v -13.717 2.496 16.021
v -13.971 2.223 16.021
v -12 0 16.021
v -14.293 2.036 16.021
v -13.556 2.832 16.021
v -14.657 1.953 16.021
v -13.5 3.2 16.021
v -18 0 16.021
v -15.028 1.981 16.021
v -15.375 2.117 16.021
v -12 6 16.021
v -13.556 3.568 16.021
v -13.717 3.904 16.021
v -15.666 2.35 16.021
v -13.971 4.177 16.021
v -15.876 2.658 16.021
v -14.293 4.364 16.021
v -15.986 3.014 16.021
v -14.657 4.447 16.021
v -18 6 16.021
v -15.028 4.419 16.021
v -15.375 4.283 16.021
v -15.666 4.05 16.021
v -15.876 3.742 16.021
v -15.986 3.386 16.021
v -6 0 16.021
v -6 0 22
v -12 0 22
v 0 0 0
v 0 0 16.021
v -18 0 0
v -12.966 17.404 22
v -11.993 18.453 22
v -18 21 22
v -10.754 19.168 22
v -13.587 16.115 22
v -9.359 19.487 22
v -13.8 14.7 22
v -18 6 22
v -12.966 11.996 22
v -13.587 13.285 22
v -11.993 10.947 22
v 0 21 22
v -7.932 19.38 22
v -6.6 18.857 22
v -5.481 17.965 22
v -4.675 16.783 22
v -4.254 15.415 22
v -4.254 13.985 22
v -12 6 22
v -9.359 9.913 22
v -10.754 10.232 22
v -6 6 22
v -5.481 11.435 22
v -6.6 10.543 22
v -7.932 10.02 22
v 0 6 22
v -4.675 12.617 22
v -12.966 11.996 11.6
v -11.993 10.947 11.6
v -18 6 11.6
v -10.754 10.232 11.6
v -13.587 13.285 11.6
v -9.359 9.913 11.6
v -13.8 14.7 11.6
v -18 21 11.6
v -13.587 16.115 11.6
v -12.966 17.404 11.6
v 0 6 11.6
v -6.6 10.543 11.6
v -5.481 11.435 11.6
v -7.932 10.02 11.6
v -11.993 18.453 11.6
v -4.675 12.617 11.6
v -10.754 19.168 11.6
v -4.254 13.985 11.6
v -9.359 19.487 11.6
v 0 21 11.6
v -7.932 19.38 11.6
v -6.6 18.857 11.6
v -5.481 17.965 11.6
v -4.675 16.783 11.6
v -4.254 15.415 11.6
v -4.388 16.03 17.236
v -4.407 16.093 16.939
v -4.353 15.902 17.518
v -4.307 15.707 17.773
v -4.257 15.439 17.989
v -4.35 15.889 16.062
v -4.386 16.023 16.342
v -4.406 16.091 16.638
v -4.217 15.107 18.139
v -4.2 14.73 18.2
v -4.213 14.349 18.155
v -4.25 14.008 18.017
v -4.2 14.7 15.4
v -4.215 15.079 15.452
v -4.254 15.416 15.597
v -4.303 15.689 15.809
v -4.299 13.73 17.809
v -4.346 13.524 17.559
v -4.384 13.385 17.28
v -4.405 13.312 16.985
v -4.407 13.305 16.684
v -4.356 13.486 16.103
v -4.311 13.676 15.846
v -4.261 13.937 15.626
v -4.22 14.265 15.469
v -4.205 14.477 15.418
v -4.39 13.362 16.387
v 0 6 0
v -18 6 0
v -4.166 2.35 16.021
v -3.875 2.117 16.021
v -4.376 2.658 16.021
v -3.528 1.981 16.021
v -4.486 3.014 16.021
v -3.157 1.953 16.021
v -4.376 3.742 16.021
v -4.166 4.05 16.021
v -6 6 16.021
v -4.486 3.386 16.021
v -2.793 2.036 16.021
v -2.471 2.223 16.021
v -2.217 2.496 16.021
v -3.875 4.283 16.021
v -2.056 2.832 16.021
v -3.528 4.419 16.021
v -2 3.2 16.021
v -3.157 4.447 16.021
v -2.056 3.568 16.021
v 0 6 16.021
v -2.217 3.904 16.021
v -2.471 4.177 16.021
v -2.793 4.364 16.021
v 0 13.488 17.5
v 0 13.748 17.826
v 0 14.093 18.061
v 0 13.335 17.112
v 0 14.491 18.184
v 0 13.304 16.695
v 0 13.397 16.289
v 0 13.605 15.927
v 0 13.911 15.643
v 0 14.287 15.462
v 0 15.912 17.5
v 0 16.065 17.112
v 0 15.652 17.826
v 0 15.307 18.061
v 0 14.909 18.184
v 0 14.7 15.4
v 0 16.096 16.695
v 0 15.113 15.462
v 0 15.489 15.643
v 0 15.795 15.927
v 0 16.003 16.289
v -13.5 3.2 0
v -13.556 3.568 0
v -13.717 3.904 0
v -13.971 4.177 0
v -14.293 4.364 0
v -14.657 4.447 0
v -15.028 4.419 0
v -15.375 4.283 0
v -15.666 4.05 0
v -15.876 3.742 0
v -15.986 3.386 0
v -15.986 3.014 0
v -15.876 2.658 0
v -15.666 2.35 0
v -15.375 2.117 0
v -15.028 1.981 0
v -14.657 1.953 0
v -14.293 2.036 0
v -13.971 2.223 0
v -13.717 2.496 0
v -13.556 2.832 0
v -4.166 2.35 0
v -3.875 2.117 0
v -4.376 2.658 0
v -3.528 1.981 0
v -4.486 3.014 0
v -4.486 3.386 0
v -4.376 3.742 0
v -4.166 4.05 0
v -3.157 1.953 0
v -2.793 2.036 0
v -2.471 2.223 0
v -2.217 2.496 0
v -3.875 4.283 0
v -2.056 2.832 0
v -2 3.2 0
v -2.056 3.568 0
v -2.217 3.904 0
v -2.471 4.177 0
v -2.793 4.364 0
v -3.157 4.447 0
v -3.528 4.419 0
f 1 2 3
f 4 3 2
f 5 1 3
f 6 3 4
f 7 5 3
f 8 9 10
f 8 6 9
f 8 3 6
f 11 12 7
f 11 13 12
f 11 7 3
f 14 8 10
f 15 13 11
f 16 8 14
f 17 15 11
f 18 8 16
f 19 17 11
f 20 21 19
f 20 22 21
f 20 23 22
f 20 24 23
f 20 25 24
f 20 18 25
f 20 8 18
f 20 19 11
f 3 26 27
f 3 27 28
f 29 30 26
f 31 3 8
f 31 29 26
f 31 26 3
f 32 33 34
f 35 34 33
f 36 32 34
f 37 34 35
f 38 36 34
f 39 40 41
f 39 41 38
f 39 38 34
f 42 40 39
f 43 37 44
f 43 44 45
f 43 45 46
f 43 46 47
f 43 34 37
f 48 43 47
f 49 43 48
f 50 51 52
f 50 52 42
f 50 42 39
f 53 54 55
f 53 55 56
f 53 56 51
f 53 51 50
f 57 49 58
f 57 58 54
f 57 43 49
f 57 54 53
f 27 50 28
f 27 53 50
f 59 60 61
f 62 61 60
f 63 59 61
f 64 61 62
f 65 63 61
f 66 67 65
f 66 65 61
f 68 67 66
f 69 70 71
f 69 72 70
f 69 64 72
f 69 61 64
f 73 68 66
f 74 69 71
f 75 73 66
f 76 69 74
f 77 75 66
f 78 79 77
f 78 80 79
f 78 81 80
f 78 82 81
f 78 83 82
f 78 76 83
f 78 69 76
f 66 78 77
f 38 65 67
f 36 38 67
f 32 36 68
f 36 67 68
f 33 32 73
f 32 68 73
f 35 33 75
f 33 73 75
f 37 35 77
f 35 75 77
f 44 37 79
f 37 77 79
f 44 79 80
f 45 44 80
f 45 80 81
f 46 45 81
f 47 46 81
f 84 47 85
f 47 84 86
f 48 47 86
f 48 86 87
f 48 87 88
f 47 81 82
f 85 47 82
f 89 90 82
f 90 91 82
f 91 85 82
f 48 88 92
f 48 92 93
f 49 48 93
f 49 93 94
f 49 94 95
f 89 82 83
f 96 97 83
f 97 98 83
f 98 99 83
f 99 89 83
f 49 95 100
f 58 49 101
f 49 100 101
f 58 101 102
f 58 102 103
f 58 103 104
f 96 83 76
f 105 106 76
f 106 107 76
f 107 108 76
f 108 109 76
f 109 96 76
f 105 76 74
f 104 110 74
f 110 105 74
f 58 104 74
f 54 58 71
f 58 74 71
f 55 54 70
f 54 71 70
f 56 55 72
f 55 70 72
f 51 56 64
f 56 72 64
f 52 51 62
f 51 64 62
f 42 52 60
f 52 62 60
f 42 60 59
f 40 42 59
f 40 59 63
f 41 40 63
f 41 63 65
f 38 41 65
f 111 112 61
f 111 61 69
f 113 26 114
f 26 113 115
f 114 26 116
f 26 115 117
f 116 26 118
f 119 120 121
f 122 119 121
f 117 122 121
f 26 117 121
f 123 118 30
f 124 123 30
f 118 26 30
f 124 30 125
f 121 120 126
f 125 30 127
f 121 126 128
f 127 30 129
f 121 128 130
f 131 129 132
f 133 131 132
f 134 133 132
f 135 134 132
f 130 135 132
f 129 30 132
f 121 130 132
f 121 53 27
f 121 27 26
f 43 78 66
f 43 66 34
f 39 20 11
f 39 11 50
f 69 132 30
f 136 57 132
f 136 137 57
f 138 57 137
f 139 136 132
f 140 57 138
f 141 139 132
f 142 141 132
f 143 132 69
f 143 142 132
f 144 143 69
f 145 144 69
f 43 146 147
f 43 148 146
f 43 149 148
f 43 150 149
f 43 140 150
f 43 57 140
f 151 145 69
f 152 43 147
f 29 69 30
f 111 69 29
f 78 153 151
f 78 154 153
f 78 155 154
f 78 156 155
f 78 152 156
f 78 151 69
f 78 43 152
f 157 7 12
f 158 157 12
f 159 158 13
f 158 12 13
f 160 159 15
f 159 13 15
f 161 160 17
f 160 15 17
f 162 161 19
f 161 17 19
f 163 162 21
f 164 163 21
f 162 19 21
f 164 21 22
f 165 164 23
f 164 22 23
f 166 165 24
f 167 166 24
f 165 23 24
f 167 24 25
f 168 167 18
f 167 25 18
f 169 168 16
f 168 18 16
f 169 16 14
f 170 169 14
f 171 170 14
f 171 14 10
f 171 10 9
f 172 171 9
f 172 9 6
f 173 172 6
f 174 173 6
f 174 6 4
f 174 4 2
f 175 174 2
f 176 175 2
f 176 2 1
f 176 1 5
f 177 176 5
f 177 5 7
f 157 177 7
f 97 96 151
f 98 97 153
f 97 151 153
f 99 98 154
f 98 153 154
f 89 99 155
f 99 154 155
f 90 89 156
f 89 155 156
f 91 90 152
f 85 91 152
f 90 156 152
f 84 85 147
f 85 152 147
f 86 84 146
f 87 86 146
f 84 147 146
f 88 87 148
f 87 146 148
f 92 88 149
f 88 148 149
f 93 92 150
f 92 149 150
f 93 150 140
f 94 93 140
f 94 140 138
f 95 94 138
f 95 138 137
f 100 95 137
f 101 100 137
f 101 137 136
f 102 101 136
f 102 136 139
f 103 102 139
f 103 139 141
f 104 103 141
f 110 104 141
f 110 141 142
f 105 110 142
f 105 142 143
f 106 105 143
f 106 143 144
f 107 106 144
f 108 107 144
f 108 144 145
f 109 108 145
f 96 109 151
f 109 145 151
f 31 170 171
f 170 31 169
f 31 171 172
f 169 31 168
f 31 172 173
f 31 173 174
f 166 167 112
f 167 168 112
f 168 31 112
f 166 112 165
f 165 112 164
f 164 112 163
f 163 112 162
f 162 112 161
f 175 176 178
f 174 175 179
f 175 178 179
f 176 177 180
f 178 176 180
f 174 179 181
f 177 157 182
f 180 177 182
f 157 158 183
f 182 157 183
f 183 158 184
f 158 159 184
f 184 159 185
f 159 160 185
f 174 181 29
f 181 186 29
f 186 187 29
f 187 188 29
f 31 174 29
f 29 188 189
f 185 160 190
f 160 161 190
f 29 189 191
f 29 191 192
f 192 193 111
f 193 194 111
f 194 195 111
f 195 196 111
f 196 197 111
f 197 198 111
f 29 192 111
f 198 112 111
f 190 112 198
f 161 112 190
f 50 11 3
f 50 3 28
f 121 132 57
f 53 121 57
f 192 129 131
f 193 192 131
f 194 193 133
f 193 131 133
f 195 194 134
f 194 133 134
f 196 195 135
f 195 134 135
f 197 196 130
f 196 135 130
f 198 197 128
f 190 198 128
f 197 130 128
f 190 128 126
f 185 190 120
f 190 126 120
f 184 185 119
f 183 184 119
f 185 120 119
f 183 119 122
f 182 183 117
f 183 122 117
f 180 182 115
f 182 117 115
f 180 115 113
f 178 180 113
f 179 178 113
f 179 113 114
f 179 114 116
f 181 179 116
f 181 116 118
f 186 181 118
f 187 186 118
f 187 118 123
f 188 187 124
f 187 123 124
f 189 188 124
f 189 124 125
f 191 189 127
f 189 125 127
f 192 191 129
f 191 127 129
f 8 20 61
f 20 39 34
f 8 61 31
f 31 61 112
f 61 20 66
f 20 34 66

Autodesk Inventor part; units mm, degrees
ref_plane "YZ Plane" through (0, 0, 0) normal (1, 0, 0) x (0, 1, 0)
ref_plane "XZ Plane" through (0, 0, 0) normal (0, 1, 0) x (-1, 0, 0)
ref_plane "XY Plane" through (0, 0, 0) normal (0, 0, 1) x (1, 0, 0)
sketch "Sketch1" plane through (0, 0, 0) normal (0, 0, 1) x (1, 0, 0)
  line L0 (0, 0) -> (-18, 0)
  line L1 (-18, 0) -> (-18, 6)
  line L2 (-18, 6) -> (0, 6)
  line L3 (0, 6) -> (0, 0)
  dimension "d0" = 18
  dimension "d1" = 6
extrude "Extrusion1" add sketch "Sketch1" along normal blind 22
sketch "Sketch2" plane through (0, 0, 22) normal (0, 0, 1) x (1, 0, 0)
  line L0 (-18, 0) -> (0, 0) projected
  line L1 (0, 0) -> (0, 6) projected
  line L2 (0, 6) -> (-18, 6) projected
  line L3 (-18, 6) -> (-18, 0) projected
  circle A0 centre (-14.75, 3.2) radius 1.25
  circle A1 centre (-3.25, 3.2) radius 1.25
  dimension "d4" = 2.5
  dimension "d5" = 2.5
  dimension "d6" = 2.8
  dimension "d7" = 2.8
  dimension "d8" = 3.25
  dimension "d9" = 3.25
  dimension "d31" = 11.5
extrude "Extrusion2" cut sketch "Sketch2" against normal through all contours A0 | A1
sketch "Sketch3" plane through (0, 0, 0) normal (1, 0, 0) x (0, 0, -1)
  line L0 (0, 6) -> (0, 0) projected
  line L1 (0, 6) -> (-22, 6) projected
  line L2 (-22, 0) -> (-22, 6) projected
  line L3 (0, 0) -> (-22, 0) projected
  line L4 (0, 6) -> (-22, 6) projected
  line L5 (-22, 6) -> (-11.6, 6)
  line L6 (-11.6, 6) -> (-11.6, 21)
  line L7 (-11.6, 21) -> (-22, 21)
  line L8 (-22, 21) -> (-22, 6)
  dimension "d12" = 10.4
  dimension "d13" = 15
extrude "Extrusion3" add sketch "Sketch3" against normal up to surface (18 mm away) contours L1 L8 L7 L6
sketch "Sketch4" plane through (0, 6, 11.6) normal (0, 0, -1) x (-1, 0, 0)
  line L0 (18, 0) -> (18, 15) projected
  line L1 (0, 15) -> (18, 15) projected
  line L2 (0, 15) -> (0, 0) projected
  line L3 (18, 0) -> (0, 0) projected
  circle A0 centre (9, 8.7) radius 4.8
  point P0 (0, -6)
  dimension "d16" = 9.6
  dimension "d17" = 6.3
extrude "Extrusion4" cut sketch "Sketch4" against normal through all contours A0
sketch "Sketch5" plane through (-18, 0, 0) normal (-1, 0, 0) x (0, 0, 1)
  line L0 (22.0213, 0) -> (16.0213, 0)
  line L1 (16.0213, 0) -> (16.0213, 6)
  line L2 (16.0213, 6) -> (22.0213, 6)
  line L3 (22.0213, 6) -> (22.0213, 0)
  point P0 (0, 0)
  dimension "d20" = 6
  dimension "d21" = 6
extrude "Extrusion5" cut sketch "Sketch5" against normal blind 6
sketch "Sketch6" plane through (0, 0, 0) normal (1, 0, 0) x (0, 0, -1)
  line L0 (-22, 6) -> (-22, 0) projected
  line L1 (-16.0213, 6) -> (-22, 6) projected
  line L2 (-16.0213, 0) -> (-16.0213, 6) projected
  line L3 (-22, 0) -> (-16.0213, 0) projected
  point P0 (0, 0)
extrude "Extrusion6" cut sketch "Sketch6" against normal blind 6
sketch "Sketch7" plane through (0, 0, 0) normal (1, 0, 0) x (0, 0, -1)
  line L0 (-6.6, 12.2) -> (-11.6, 12.2)
  line L1 (-6.6, 17.2) -> (-11.6, 17.2)
  line L2 (-11.6, 21) -> (-11.6, 6) projected
  line L3 (-22, 6) -> (-22, 21) projected
  circle A0 centre (-16.8, 14.7) radius 1.4
  point P0 (0, 0)
  dimension "d26" = 2.8
  dimension "d27" = 5.2
  dimension "d28" = 2.5
extrude "Extrusion7" cut sketch "Sketch7" against normal blind 6
equation "\"d9\" = d8"
properties part number "00_micrometer_moun_xystage_china_new"
